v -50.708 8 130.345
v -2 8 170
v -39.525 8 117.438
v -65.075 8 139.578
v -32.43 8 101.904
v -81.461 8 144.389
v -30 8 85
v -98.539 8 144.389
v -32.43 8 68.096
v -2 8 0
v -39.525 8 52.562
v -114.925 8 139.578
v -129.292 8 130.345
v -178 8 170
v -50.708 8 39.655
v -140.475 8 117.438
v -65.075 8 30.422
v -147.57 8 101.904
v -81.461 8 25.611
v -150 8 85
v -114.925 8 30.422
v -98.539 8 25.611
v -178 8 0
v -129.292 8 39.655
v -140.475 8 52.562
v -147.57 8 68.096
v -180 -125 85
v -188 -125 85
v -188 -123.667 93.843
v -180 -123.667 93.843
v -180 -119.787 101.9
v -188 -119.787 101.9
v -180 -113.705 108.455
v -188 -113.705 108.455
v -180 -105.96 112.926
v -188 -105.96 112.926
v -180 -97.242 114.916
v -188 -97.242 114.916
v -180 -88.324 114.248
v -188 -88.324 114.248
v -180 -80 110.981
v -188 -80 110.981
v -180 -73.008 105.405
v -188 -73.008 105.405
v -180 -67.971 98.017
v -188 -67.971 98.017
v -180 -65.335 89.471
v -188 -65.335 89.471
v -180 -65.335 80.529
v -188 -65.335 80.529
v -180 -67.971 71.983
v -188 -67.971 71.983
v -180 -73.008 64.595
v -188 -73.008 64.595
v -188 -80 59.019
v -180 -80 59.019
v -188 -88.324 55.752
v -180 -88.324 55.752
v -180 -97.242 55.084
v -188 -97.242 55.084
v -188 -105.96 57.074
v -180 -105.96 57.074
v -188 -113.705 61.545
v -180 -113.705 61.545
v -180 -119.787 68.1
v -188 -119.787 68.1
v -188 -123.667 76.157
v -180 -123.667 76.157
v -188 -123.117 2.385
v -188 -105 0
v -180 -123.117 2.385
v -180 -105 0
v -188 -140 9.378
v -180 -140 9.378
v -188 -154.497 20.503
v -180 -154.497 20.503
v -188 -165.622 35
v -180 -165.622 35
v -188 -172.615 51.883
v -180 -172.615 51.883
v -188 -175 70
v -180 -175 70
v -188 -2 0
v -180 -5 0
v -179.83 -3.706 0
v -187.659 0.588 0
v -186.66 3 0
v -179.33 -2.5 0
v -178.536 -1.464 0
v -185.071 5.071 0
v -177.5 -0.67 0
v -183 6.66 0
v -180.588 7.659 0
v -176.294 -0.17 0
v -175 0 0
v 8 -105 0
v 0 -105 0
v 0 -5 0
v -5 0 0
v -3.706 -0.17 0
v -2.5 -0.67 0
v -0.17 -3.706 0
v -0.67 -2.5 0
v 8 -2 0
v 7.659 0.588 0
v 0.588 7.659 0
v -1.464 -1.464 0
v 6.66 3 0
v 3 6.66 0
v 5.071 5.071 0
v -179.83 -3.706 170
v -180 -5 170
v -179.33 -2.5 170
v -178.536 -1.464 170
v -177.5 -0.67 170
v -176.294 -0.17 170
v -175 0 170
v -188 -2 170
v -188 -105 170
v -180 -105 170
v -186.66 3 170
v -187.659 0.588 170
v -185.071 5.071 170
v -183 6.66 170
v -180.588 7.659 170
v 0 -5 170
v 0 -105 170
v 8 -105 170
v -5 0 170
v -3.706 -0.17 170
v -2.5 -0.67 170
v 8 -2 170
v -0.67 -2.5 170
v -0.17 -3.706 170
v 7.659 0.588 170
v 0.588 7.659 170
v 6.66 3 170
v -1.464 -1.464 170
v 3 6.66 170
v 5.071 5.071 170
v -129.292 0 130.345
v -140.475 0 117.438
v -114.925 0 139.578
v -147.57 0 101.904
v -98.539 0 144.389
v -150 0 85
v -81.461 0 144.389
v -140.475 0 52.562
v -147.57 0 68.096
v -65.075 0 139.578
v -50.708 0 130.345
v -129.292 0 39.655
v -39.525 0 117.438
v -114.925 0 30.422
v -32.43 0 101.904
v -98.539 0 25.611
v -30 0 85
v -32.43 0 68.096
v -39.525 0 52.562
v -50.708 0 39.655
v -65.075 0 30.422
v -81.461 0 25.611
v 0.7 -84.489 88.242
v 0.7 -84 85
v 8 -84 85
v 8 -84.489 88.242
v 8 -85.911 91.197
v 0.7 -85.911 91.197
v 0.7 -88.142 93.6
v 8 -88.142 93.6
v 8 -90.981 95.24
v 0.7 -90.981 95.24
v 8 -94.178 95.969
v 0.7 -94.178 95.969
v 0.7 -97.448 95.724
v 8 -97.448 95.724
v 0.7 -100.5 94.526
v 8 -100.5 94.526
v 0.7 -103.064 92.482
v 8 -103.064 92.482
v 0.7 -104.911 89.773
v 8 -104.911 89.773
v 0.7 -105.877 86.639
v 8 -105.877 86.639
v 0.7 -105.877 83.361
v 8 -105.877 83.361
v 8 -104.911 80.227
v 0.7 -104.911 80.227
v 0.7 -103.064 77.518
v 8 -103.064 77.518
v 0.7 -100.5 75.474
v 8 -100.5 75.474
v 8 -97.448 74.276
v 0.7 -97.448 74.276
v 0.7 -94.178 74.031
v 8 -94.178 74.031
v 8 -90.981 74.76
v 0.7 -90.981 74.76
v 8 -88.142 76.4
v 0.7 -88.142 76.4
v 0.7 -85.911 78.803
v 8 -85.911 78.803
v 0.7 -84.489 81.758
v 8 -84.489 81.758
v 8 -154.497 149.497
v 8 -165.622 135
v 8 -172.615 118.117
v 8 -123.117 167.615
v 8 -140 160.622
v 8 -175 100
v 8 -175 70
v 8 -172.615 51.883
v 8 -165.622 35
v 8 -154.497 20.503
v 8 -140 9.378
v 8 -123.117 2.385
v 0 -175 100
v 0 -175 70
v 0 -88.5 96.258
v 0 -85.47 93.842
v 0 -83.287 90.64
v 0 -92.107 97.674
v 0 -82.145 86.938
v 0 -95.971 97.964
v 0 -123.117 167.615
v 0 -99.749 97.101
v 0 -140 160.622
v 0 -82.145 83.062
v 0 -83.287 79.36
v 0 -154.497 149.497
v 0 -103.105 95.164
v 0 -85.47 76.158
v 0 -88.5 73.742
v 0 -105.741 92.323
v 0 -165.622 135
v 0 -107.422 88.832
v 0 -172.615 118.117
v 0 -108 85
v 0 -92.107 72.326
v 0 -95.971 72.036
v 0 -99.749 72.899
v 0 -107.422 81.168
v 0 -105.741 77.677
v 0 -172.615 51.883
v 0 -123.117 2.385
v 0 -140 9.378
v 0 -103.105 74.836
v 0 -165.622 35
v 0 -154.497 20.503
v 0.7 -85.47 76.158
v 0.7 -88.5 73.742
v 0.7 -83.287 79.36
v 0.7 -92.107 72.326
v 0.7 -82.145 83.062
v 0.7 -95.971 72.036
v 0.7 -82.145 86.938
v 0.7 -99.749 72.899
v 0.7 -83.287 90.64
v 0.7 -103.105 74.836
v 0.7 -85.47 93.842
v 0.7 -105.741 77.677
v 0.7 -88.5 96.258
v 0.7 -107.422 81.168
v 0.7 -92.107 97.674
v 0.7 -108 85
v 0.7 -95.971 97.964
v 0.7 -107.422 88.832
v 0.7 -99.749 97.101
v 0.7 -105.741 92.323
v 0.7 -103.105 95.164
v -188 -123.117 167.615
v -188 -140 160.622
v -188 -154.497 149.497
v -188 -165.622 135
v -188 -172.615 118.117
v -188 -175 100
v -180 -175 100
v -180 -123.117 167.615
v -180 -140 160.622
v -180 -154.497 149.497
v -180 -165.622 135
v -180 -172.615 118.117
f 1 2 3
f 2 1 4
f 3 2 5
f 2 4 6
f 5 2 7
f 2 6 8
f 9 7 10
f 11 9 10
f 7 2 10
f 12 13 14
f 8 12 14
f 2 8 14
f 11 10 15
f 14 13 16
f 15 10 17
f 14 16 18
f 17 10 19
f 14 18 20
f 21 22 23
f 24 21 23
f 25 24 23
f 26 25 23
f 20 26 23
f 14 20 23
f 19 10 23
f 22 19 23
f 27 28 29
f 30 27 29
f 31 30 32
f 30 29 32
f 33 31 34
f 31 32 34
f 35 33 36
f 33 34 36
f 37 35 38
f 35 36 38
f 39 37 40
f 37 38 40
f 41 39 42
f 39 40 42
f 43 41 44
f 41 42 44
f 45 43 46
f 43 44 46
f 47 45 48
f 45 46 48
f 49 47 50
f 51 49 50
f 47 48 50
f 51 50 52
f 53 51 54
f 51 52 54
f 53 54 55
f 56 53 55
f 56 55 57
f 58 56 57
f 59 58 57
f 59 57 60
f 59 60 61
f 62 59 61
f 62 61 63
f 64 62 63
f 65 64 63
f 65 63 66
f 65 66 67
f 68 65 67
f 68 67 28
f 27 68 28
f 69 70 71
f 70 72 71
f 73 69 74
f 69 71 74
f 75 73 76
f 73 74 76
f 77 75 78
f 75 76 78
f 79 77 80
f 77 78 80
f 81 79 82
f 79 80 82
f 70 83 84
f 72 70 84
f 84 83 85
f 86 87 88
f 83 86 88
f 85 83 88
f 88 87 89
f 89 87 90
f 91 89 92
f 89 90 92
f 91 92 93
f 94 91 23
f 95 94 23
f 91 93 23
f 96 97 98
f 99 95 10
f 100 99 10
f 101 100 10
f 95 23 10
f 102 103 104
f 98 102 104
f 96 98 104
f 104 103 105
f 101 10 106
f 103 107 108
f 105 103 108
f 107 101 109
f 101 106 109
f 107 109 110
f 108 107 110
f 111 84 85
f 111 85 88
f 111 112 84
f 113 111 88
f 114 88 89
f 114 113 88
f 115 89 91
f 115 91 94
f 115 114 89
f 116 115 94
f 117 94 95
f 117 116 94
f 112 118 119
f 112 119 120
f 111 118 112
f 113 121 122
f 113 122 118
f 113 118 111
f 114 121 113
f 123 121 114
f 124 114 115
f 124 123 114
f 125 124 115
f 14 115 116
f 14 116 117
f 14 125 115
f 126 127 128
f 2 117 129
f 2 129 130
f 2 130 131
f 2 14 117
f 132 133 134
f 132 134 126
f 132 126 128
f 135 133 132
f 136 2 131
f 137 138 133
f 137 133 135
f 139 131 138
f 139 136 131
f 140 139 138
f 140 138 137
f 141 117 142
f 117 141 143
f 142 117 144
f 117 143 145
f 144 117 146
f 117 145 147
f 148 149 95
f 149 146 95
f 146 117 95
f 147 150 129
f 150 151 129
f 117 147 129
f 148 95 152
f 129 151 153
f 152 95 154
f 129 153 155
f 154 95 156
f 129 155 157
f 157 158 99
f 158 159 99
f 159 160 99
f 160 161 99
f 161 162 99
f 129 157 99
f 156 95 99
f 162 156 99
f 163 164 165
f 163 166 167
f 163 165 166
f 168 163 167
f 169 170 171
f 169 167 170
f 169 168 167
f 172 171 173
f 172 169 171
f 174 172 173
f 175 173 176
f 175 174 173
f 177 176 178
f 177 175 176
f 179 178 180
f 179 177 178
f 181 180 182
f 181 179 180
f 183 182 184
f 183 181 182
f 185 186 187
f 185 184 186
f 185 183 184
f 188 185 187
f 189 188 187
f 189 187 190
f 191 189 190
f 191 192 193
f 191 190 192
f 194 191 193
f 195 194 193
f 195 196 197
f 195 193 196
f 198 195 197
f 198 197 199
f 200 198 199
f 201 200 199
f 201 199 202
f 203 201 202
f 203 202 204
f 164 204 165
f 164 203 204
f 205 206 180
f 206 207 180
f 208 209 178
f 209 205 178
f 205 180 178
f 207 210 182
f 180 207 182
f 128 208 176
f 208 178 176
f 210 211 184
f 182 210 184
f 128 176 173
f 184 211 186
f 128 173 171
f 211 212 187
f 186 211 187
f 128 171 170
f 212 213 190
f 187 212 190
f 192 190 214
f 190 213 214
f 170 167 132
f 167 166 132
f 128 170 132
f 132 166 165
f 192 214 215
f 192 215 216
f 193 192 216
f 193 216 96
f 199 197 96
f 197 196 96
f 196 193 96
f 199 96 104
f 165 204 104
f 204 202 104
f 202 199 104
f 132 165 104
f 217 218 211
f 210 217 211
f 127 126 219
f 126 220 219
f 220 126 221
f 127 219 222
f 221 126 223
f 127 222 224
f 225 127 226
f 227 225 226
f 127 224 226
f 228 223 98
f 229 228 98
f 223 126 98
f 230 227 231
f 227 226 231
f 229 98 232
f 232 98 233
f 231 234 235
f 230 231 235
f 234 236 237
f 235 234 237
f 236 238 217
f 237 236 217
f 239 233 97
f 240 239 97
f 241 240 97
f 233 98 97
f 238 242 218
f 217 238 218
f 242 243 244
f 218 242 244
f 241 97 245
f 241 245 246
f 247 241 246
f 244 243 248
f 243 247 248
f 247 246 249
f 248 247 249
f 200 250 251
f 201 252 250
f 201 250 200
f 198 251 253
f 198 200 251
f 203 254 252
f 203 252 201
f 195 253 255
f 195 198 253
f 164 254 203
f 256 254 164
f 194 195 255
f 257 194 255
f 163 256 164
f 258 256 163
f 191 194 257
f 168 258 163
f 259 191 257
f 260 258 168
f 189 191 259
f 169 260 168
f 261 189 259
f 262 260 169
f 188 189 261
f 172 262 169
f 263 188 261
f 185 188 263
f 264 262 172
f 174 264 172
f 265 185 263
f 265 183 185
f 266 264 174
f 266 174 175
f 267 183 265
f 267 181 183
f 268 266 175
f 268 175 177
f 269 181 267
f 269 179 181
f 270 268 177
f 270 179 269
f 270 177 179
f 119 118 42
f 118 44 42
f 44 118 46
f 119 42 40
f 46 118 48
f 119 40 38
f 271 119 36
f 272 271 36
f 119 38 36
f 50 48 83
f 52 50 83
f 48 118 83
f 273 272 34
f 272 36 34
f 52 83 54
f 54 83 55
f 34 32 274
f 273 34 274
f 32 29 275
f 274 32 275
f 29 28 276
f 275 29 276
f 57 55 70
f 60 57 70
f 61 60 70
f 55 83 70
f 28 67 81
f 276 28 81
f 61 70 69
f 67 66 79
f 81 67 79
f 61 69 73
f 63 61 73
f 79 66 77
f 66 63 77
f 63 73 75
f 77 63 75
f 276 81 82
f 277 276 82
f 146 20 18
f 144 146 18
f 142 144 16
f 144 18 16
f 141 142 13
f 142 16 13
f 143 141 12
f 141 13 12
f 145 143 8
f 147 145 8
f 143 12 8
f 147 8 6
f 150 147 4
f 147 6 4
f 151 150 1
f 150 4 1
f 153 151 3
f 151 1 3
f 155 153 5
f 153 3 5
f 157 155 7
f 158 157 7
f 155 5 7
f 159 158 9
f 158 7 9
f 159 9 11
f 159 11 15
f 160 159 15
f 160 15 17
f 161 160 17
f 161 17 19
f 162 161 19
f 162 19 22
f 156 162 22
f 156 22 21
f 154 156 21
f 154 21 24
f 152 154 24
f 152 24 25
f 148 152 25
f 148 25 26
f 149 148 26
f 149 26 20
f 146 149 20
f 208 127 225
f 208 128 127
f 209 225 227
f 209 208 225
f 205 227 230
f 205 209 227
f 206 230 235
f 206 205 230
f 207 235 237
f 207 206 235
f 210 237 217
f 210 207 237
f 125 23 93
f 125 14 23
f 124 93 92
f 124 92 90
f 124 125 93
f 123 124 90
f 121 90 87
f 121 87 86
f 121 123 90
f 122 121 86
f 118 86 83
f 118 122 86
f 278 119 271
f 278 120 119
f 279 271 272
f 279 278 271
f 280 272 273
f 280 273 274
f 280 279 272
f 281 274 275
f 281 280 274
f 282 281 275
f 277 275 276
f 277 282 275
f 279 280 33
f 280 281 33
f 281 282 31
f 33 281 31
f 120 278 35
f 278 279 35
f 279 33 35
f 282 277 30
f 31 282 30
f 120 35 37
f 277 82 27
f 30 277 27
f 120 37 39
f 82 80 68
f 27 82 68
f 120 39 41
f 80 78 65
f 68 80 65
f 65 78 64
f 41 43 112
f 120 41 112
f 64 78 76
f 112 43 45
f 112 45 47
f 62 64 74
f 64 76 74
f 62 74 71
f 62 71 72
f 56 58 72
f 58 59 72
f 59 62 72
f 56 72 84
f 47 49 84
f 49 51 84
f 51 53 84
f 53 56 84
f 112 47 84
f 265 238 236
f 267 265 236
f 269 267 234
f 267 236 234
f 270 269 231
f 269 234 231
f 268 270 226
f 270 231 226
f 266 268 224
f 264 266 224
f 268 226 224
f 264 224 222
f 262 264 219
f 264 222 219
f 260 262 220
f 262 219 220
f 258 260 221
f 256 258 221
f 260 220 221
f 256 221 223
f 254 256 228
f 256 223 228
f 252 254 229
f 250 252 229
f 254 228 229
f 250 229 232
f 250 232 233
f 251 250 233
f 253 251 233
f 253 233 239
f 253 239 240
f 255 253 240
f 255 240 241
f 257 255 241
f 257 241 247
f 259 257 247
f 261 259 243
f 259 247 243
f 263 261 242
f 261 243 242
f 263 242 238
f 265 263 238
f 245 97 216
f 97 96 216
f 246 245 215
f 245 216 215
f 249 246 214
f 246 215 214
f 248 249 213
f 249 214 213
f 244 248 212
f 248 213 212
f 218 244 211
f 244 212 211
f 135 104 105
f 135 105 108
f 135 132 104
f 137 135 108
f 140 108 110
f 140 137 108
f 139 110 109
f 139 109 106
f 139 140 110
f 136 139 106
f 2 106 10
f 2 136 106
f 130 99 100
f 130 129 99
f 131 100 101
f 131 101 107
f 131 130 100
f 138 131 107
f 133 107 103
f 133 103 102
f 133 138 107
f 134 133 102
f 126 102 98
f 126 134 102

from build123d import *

# Parameters (mm, degrees)
EXTRUDE_1_DEPTH          = 170
SKETCH_2_R               = 60
CUT_EXTRUDE_1_DEPTH      = 180
CUT_EXTRUDE_2_DEPTH      = 313.955268369
CUT_EXTRUDE_2_DEPTH_BACK = 313.955268369
SKETCH_3_R               = 11
FILLET_1_R               = 70
FILLET_2_R               = 5
FILLET_3_R               = 10
SKETCH_6_R               = 30
CUT_EXTRUDE_6_DEPTH      = 39
SKETCH_7_R               = 13
CUT_EXTRUDE_7_DEPTH      = 0.7


with BuildPart() as part:
    # 草图1 → 凸台-拉伸1 (new body)
    with BuildSketch(Plane.XY):
        Polygon((-180, 0), (0, 0), (0, -175), (8, -175), (8, 8), (-180, 8), (-188, 8), (-188, -175), (-180, -175), align=None)
    extrude(amount=EXTRUDE_1_DEPTH)

    # 草图2 → 切除-拉伸1 (cut)
    with BuildSketch(Plane(origin=(0, 8, 0), x_dir=(1, 0, 0), z_dir=(0, 1, 0))):
        with Locations(Location((-90, -85, 0), (0, 0, 180))):
            Circle(SKETCH_2_R)
    extrude(amount=-CUT_EXTRUDE_1_DEPTH, mode=Mode.SUBTRACT)

    # 草图3 → 切除-拉伸2 (cut, two sides: drawn at the far end of the back side and taken through both)
    with BuildSketch(Plane(origin=(8, 0, 0), x_dir=(0, 0, -1), z_dir=(1, 0, 0)).offset(-CUT_EXTRUDE_2_DEPTH_BACK)):
        with Locations(Location((-85, -95, 0), (0, 0, 90))):
            Circle(SKETCH_3_R)
    extrude(amount=CUT_EXTRUDE_2_DEPTH + CUT_EXTRUDE_2_DEPTH_BACK, mode=Mode.SUBTRACT)

    # 圆角1
    fillet_1_edges = [part.edges().sort_by_distance(p)[0] for p in [
        (4, -175, 0),
        (4, -175, 170),
        (-184, -175, 170),
        (-184, -175, 0),
    ]]
    fillet(fillet_1_edges, radius=FILLET_1_R)

    # 圆角2
    fillet_2_edges = [part.edges().sort_by_distance(p)[0] for p in [
        (0, 0, 85),
        (-180, 0, 85),
    ]]
    fillet(fillet_2_edges, radius=FILLET_2_R)

    # 圆角3
    fillet_3_edges = [part.edges().sort_by_distance(p)[0] for p in [
        (-188, 8, 85),
        (8, 8, 85),
    ]]
    fillet(fillet_3_edges, radius=FILLET_3_R)

    # 草图6 → 切除-拉伸6 (cut)
    with BuildSketch(Plane.ZY.offset(188)):
        with Locations(Location((85, -95, 0), (0, 0, 270))):
            Circle(SKETCH_6_R)
    extrude(amount=-CUT_EXTRUDE_6_DEPTH, mode=Mode.SUBTRACT)

    # 草图7 → 切除-拉伸7 (cut)
    with BuildSketch(Plane.ZY):
        with Locations(Location((85, -95, 0), (0, 0, 270))):
            Circle(SKETCH_7_R)
    extrude(amount=-CUT_EXTRUDE_7_DEPTH, mode=Mode.SUBTRACT)


solid = part.part
